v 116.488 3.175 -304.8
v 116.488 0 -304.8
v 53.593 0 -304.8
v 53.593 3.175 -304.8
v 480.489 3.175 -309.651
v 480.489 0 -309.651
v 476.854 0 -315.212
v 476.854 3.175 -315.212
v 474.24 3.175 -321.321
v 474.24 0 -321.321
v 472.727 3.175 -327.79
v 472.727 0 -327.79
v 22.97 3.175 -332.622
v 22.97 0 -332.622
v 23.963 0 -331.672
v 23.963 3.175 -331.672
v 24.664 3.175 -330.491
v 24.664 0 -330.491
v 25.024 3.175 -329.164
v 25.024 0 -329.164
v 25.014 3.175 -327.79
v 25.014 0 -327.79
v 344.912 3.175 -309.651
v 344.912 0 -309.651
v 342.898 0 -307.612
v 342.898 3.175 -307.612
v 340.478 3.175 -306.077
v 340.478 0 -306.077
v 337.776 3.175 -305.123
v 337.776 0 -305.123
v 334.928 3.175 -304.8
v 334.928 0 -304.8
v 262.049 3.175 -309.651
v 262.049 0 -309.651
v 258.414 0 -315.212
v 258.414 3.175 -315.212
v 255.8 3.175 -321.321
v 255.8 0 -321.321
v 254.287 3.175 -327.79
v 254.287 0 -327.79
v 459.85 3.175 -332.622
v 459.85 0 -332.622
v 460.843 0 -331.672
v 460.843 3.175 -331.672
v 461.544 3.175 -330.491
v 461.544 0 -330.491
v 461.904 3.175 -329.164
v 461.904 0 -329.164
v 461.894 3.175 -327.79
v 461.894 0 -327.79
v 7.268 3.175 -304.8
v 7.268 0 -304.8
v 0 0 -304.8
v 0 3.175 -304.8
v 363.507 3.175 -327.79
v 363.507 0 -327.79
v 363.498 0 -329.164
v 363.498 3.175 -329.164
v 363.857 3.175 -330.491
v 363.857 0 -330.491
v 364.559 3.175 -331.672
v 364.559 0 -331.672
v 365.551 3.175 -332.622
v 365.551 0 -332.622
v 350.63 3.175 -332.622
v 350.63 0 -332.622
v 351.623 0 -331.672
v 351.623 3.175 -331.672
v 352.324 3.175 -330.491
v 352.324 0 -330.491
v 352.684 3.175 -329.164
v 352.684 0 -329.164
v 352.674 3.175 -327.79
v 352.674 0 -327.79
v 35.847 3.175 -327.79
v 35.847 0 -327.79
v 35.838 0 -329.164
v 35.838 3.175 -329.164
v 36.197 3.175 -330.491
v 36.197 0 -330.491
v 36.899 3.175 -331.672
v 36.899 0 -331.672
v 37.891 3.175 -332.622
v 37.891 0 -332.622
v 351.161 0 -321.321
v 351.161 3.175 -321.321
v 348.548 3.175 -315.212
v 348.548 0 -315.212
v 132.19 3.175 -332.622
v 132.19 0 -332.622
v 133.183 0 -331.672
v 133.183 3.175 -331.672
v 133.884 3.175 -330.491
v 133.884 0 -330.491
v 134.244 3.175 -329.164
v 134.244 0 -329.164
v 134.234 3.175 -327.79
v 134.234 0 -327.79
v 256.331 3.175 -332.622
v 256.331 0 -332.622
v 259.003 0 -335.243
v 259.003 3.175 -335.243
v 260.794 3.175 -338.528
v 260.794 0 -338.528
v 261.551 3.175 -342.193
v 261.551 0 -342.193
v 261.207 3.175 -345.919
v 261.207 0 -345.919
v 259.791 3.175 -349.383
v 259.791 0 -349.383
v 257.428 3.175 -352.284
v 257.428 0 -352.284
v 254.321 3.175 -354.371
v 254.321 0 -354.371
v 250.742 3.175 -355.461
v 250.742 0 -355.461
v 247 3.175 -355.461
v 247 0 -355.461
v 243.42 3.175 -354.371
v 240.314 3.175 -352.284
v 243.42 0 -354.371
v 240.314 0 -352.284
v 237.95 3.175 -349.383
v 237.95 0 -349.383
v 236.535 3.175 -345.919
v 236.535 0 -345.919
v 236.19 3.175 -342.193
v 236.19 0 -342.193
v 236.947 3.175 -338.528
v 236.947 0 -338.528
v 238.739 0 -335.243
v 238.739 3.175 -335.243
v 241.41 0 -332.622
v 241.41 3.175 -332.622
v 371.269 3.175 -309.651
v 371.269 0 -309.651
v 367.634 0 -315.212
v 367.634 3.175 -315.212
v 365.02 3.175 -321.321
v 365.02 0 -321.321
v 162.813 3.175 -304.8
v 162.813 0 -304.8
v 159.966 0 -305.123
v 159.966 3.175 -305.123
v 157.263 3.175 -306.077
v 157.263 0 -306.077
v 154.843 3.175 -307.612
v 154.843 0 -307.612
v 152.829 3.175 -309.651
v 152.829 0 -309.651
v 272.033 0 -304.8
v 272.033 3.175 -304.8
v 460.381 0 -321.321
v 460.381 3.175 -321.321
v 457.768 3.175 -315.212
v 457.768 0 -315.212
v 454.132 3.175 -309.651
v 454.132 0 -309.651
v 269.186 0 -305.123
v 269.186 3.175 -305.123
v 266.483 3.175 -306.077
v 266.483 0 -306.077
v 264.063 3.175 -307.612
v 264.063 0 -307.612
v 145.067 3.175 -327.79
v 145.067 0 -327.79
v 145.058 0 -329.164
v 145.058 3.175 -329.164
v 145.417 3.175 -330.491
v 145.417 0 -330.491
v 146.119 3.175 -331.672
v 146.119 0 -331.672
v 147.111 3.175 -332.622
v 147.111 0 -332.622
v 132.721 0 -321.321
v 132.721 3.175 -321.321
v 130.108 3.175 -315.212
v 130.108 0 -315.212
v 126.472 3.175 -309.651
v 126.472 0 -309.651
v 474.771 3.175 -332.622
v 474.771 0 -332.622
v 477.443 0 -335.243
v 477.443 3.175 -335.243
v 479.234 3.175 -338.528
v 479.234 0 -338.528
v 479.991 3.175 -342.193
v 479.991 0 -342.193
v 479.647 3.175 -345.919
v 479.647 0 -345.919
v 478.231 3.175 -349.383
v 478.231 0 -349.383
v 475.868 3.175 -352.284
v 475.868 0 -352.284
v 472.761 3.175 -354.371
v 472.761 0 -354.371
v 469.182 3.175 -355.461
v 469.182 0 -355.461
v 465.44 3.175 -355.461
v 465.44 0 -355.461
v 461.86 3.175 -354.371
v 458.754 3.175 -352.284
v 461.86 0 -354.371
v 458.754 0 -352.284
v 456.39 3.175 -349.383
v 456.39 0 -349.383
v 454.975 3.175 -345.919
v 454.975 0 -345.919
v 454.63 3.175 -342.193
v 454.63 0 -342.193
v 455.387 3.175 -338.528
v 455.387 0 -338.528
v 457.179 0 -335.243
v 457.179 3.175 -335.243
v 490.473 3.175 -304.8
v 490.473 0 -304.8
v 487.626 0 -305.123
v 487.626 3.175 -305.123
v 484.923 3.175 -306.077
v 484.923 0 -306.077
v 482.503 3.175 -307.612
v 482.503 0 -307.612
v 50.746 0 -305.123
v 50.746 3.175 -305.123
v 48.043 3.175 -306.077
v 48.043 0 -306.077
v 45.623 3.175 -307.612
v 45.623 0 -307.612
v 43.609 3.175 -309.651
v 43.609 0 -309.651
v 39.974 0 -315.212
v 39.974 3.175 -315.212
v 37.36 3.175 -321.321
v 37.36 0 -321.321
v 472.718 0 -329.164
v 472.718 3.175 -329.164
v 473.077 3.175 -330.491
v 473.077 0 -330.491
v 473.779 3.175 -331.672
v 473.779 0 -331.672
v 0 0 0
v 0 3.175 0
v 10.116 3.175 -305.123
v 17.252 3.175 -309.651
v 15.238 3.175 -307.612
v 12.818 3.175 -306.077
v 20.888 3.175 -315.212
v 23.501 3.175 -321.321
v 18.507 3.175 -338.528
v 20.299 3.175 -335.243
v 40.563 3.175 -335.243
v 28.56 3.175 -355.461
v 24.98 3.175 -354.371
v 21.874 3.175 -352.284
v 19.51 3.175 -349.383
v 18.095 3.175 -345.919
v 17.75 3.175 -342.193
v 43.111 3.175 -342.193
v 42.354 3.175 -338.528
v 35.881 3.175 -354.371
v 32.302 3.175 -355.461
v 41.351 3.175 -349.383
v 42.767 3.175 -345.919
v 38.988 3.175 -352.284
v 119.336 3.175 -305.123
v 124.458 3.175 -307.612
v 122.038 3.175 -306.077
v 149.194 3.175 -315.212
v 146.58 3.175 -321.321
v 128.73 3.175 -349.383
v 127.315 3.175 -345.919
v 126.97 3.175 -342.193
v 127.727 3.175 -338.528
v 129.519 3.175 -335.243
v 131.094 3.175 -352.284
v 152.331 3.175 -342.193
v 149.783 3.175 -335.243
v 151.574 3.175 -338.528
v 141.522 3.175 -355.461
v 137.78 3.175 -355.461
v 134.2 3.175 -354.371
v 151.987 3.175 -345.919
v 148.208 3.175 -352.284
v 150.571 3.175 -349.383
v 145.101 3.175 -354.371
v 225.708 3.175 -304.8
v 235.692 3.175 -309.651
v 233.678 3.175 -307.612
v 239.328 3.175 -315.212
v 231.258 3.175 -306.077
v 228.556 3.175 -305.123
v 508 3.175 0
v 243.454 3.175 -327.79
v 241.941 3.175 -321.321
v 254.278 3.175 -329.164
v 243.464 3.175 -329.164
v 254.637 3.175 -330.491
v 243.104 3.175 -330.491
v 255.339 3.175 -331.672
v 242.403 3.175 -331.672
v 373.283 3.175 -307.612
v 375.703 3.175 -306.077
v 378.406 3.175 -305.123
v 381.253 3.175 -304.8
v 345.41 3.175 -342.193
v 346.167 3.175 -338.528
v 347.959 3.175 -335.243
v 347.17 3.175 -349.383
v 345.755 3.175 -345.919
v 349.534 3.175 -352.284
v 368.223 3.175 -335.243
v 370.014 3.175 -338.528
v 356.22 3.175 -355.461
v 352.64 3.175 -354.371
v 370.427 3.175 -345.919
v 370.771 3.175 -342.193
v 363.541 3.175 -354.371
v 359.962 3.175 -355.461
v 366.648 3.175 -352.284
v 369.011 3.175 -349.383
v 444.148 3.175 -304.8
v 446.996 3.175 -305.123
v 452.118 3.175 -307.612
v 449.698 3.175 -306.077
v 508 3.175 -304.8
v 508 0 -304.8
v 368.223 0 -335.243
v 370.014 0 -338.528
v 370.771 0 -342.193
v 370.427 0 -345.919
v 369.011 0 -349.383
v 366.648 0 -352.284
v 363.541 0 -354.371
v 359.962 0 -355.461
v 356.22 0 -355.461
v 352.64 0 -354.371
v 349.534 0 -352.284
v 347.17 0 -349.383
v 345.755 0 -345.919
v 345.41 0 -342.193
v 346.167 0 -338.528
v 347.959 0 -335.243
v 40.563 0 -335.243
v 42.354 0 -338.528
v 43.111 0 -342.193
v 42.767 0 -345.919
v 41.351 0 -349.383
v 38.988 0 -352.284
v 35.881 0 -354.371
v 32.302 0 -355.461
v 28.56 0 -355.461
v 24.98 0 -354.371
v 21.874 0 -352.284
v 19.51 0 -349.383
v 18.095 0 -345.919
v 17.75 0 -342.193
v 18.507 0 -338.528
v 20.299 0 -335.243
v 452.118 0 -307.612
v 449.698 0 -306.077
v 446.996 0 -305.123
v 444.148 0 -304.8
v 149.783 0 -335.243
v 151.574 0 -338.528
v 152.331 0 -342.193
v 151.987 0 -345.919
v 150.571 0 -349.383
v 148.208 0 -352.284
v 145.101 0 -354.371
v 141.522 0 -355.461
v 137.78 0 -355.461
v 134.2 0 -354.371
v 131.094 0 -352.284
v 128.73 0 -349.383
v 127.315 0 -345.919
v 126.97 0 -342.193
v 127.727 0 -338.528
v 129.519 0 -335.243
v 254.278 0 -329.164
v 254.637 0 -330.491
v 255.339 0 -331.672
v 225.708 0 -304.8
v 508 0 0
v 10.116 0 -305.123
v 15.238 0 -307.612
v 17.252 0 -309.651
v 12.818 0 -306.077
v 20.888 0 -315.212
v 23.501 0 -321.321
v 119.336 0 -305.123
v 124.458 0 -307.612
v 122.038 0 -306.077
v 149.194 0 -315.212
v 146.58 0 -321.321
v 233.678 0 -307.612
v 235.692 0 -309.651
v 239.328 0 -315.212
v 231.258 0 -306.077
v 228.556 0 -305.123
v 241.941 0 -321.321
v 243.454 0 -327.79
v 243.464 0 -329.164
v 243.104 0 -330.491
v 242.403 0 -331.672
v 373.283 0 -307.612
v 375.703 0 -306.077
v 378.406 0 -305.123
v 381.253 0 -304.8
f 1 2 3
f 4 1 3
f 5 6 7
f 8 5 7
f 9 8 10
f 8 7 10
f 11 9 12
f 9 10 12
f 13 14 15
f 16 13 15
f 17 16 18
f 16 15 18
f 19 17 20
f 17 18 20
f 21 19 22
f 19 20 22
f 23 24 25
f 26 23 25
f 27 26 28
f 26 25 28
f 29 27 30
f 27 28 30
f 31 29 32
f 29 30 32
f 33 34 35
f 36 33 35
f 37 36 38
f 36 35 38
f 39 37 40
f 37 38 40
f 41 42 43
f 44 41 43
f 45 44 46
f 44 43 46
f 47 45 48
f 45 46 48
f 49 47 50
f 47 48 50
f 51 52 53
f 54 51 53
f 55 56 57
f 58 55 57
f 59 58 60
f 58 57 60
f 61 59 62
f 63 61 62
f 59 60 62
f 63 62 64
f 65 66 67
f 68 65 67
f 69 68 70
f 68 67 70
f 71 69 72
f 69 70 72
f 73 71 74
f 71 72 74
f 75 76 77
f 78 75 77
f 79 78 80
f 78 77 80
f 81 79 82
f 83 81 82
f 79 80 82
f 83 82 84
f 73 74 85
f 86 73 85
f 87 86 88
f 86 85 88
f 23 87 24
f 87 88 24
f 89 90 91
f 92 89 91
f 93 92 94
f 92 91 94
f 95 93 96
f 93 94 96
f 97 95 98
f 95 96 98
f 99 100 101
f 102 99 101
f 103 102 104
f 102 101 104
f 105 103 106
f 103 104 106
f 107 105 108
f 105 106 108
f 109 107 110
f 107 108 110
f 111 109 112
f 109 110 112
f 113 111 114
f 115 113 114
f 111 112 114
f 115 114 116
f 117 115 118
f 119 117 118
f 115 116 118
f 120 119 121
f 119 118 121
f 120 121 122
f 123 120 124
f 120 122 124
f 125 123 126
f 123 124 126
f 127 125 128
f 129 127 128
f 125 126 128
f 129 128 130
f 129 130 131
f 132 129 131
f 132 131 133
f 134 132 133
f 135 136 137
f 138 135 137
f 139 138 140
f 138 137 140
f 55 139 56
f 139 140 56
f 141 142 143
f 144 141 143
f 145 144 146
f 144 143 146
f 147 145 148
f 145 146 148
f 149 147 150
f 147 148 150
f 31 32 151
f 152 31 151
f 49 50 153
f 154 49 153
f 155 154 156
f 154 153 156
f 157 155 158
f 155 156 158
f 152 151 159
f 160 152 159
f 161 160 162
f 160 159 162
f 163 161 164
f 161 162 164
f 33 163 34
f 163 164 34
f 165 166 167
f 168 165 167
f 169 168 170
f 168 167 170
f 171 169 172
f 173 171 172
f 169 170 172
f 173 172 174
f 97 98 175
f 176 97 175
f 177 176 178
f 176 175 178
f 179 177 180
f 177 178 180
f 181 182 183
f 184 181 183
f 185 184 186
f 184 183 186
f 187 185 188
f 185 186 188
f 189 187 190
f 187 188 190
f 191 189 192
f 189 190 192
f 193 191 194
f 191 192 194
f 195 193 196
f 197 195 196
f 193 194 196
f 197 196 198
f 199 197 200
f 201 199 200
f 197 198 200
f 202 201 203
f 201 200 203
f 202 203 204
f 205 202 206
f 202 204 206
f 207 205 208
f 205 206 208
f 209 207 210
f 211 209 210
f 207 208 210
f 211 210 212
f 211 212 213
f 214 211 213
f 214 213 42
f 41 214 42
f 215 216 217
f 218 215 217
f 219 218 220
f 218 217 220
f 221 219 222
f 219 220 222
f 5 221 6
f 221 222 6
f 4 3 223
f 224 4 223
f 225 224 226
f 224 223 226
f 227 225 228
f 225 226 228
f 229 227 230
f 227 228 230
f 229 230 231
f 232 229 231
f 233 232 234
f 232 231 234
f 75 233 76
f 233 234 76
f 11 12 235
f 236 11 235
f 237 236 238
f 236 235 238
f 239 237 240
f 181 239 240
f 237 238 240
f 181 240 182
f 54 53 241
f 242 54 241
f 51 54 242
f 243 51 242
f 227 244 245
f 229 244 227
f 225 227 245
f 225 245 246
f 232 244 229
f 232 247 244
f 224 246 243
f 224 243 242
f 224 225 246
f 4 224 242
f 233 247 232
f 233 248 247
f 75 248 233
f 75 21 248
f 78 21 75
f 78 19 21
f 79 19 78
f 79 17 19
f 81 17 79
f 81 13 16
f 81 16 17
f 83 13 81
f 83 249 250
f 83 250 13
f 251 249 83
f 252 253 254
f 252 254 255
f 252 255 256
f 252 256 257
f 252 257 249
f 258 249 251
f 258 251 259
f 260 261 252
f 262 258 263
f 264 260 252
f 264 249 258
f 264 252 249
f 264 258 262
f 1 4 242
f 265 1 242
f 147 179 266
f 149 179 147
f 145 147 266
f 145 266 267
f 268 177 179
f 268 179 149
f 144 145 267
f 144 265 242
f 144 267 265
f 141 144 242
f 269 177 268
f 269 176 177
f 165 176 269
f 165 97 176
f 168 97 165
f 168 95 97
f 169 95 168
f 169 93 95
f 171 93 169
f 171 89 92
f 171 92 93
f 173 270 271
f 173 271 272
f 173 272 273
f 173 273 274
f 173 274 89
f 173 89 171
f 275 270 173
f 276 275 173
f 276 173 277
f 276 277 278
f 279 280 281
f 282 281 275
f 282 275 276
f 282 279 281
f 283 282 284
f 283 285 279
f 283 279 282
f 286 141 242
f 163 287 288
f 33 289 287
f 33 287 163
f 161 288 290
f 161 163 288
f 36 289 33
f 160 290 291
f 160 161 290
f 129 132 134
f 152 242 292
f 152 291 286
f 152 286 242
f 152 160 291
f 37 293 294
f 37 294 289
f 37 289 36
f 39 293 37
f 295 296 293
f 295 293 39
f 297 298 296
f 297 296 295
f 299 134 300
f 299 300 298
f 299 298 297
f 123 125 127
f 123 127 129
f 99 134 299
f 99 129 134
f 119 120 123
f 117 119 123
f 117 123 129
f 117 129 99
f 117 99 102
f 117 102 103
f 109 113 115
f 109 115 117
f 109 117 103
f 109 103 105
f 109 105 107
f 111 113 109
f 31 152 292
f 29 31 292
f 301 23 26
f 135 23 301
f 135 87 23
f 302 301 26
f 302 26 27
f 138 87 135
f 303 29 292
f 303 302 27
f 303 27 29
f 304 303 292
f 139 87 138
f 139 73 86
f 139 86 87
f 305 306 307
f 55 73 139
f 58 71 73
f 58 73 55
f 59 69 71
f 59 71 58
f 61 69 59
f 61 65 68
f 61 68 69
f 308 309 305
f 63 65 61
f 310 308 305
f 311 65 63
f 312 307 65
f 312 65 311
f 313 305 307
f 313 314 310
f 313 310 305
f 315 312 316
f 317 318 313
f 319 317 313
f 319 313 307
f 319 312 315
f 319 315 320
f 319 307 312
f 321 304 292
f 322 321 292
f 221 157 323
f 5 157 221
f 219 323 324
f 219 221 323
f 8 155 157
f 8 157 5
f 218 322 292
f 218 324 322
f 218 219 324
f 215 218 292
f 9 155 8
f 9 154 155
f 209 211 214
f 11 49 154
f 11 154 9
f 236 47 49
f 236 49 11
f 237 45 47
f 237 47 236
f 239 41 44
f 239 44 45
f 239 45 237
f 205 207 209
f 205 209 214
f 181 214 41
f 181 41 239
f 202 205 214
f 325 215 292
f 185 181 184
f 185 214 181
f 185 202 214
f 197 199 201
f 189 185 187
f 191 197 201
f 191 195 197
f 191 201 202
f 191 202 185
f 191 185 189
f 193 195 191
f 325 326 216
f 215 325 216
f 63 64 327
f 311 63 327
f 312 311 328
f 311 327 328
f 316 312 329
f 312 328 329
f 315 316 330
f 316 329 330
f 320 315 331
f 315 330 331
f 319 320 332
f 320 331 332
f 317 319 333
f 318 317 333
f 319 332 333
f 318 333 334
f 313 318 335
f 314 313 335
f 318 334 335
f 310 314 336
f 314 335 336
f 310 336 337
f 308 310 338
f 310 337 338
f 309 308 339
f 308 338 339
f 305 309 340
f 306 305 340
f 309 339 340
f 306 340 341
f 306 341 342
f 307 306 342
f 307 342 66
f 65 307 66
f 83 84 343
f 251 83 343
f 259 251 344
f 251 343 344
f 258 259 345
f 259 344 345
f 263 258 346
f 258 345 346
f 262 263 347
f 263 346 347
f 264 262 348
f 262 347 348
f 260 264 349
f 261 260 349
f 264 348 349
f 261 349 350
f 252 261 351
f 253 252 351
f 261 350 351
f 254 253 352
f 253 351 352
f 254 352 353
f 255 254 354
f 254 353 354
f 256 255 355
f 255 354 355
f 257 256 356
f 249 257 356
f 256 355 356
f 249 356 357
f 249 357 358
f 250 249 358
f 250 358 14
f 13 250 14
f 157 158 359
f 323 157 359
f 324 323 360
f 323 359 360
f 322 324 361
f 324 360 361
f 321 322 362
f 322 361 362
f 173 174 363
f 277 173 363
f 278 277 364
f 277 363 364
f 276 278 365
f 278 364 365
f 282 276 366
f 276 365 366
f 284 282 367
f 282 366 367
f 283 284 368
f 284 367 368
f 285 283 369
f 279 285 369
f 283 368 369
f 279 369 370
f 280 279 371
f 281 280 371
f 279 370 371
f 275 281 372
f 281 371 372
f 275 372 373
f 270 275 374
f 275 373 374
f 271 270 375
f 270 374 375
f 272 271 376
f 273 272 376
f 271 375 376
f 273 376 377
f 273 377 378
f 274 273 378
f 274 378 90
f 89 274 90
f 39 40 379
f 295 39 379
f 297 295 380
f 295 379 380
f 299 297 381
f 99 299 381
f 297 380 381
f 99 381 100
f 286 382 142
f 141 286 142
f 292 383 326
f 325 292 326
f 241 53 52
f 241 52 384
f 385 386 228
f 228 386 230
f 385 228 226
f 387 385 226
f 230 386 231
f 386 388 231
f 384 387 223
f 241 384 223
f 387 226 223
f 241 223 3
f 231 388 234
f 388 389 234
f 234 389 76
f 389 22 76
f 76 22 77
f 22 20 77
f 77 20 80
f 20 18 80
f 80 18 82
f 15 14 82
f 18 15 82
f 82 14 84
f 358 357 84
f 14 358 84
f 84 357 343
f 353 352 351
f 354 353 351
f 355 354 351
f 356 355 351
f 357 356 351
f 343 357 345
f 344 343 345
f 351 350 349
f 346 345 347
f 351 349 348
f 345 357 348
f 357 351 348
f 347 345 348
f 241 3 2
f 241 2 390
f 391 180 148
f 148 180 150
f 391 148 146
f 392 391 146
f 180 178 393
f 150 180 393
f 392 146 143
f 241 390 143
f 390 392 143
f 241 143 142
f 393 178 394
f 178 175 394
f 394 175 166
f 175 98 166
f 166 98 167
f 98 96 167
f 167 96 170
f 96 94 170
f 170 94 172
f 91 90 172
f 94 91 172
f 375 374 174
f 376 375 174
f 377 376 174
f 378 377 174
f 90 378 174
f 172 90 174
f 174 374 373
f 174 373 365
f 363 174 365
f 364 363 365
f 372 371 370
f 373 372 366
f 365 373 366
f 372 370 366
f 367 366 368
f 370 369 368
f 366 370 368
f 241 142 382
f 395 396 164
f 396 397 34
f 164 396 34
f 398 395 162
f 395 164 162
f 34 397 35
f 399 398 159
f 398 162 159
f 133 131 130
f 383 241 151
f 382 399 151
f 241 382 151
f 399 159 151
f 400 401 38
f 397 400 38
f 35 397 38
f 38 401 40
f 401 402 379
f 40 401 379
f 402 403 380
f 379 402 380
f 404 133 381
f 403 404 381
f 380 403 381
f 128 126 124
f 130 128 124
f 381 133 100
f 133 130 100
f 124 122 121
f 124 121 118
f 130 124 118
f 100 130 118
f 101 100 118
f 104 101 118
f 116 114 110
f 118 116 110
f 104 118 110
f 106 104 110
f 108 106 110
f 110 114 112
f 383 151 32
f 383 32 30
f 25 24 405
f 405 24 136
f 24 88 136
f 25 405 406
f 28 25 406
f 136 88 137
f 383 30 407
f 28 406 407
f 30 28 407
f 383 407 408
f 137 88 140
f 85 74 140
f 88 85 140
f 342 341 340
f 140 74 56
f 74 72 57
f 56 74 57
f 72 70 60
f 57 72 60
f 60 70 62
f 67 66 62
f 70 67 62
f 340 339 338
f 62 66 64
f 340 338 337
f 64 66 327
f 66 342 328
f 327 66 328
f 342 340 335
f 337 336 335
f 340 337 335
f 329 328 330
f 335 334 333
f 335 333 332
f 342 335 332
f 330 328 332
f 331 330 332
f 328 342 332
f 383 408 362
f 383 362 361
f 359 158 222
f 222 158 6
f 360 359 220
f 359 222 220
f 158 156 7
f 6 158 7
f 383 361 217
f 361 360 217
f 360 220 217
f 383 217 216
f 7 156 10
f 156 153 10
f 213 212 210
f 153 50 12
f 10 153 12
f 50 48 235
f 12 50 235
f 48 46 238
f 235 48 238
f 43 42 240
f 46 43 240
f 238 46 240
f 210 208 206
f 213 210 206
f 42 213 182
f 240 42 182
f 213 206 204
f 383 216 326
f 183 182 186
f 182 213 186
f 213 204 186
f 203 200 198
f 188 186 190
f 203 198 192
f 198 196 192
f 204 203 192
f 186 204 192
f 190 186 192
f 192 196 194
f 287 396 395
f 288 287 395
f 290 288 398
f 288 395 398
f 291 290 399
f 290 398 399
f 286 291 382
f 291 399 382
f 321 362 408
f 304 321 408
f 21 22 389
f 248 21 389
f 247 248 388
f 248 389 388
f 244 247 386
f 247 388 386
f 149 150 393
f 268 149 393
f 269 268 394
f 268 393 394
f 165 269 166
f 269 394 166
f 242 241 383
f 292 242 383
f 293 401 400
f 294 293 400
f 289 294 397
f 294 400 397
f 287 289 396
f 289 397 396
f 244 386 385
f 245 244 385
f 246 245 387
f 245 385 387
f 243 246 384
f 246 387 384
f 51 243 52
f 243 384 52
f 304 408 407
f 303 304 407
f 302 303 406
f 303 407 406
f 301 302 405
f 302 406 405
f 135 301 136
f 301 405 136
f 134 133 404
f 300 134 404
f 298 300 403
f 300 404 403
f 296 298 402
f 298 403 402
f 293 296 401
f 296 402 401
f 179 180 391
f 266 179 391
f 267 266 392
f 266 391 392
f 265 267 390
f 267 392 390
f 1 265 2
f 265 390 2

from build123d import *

# Parameters (mm, degrees)
BOSS_EXTRUDE1_DEPTH = 3.175
BOSS_EXTRUDE2_DEPTH = 3.175
LPATTERN1_COUNT     = 5
LPATTERN1_PITCH     = 109.22


with BuildPart() as part:
    # Sketch1 → Boss-Extrude1 (new body)
    with BuildSketch(Plane(origin=(0, 0, 0), x_dir=(1, 0, 0), z_dir=(0, 1, 0))):
        Polygon((0, 304.8), (0, 0), (508, 0), (508, 304.8), (53.593132378, 304.8), (7.268244995, 304.8), align=None)
    extrude(amount=BOSS_EXTRUDE1_DEPTH)

    # Sketch1<3> → Boss-Extrude2 (add)
    with BuildSketch(Plane(origin=(0, 0, 0), x_dir=(1, 0, 0), z_dir=(0, 1, 0))):
        with BuildLine():
            ThreePointArc((17.252367493, 309.650968343), (12.818348506, 306.076937756), (7.268244995, 304.8))
            Line((7.268244995, 304.8), (53.593132378, 304.8))
            ThreePointArc((53.593132378, 304.8), (48.043028868, 306.076937756), (43.609009881, 309.650968343))
            ThreePointArc((43.609009881, 309.650968343), (38.533476821, 318.209528266), (35.84709227, 327.790411412))
            ThreePointArc((35.84709227, 327.790411412), (36.197138958, 330.490776765), (37.891385065, 332.62245119))
            ThreePointArc((37.891385065, 332.62245119), (30.430688687, 355.6), (22.969992308, 332.62245119))
            ThreePointArc((22.969992308, 332.62245119), (24.664238415, 330.490776765), (25.014285104, 327.790411412))
            ThreePointArc((25.014285104, 327.790411412), (22.327900553, 318.209528266), (17.252367493, 309.650968343))
        make_face()
    boss_extrude2 = extrude(amount=BOSS_EXTRUDE2_DEPTH)

    # LPattern1: Boss-Extrude2 ×5
    with Locations(*[(i * LPATTERN1_PITCH, 0, 0) for i in range(1, LPATTERN1_COUNT)]):
        add(boss_extrude2)


solid = part.part
